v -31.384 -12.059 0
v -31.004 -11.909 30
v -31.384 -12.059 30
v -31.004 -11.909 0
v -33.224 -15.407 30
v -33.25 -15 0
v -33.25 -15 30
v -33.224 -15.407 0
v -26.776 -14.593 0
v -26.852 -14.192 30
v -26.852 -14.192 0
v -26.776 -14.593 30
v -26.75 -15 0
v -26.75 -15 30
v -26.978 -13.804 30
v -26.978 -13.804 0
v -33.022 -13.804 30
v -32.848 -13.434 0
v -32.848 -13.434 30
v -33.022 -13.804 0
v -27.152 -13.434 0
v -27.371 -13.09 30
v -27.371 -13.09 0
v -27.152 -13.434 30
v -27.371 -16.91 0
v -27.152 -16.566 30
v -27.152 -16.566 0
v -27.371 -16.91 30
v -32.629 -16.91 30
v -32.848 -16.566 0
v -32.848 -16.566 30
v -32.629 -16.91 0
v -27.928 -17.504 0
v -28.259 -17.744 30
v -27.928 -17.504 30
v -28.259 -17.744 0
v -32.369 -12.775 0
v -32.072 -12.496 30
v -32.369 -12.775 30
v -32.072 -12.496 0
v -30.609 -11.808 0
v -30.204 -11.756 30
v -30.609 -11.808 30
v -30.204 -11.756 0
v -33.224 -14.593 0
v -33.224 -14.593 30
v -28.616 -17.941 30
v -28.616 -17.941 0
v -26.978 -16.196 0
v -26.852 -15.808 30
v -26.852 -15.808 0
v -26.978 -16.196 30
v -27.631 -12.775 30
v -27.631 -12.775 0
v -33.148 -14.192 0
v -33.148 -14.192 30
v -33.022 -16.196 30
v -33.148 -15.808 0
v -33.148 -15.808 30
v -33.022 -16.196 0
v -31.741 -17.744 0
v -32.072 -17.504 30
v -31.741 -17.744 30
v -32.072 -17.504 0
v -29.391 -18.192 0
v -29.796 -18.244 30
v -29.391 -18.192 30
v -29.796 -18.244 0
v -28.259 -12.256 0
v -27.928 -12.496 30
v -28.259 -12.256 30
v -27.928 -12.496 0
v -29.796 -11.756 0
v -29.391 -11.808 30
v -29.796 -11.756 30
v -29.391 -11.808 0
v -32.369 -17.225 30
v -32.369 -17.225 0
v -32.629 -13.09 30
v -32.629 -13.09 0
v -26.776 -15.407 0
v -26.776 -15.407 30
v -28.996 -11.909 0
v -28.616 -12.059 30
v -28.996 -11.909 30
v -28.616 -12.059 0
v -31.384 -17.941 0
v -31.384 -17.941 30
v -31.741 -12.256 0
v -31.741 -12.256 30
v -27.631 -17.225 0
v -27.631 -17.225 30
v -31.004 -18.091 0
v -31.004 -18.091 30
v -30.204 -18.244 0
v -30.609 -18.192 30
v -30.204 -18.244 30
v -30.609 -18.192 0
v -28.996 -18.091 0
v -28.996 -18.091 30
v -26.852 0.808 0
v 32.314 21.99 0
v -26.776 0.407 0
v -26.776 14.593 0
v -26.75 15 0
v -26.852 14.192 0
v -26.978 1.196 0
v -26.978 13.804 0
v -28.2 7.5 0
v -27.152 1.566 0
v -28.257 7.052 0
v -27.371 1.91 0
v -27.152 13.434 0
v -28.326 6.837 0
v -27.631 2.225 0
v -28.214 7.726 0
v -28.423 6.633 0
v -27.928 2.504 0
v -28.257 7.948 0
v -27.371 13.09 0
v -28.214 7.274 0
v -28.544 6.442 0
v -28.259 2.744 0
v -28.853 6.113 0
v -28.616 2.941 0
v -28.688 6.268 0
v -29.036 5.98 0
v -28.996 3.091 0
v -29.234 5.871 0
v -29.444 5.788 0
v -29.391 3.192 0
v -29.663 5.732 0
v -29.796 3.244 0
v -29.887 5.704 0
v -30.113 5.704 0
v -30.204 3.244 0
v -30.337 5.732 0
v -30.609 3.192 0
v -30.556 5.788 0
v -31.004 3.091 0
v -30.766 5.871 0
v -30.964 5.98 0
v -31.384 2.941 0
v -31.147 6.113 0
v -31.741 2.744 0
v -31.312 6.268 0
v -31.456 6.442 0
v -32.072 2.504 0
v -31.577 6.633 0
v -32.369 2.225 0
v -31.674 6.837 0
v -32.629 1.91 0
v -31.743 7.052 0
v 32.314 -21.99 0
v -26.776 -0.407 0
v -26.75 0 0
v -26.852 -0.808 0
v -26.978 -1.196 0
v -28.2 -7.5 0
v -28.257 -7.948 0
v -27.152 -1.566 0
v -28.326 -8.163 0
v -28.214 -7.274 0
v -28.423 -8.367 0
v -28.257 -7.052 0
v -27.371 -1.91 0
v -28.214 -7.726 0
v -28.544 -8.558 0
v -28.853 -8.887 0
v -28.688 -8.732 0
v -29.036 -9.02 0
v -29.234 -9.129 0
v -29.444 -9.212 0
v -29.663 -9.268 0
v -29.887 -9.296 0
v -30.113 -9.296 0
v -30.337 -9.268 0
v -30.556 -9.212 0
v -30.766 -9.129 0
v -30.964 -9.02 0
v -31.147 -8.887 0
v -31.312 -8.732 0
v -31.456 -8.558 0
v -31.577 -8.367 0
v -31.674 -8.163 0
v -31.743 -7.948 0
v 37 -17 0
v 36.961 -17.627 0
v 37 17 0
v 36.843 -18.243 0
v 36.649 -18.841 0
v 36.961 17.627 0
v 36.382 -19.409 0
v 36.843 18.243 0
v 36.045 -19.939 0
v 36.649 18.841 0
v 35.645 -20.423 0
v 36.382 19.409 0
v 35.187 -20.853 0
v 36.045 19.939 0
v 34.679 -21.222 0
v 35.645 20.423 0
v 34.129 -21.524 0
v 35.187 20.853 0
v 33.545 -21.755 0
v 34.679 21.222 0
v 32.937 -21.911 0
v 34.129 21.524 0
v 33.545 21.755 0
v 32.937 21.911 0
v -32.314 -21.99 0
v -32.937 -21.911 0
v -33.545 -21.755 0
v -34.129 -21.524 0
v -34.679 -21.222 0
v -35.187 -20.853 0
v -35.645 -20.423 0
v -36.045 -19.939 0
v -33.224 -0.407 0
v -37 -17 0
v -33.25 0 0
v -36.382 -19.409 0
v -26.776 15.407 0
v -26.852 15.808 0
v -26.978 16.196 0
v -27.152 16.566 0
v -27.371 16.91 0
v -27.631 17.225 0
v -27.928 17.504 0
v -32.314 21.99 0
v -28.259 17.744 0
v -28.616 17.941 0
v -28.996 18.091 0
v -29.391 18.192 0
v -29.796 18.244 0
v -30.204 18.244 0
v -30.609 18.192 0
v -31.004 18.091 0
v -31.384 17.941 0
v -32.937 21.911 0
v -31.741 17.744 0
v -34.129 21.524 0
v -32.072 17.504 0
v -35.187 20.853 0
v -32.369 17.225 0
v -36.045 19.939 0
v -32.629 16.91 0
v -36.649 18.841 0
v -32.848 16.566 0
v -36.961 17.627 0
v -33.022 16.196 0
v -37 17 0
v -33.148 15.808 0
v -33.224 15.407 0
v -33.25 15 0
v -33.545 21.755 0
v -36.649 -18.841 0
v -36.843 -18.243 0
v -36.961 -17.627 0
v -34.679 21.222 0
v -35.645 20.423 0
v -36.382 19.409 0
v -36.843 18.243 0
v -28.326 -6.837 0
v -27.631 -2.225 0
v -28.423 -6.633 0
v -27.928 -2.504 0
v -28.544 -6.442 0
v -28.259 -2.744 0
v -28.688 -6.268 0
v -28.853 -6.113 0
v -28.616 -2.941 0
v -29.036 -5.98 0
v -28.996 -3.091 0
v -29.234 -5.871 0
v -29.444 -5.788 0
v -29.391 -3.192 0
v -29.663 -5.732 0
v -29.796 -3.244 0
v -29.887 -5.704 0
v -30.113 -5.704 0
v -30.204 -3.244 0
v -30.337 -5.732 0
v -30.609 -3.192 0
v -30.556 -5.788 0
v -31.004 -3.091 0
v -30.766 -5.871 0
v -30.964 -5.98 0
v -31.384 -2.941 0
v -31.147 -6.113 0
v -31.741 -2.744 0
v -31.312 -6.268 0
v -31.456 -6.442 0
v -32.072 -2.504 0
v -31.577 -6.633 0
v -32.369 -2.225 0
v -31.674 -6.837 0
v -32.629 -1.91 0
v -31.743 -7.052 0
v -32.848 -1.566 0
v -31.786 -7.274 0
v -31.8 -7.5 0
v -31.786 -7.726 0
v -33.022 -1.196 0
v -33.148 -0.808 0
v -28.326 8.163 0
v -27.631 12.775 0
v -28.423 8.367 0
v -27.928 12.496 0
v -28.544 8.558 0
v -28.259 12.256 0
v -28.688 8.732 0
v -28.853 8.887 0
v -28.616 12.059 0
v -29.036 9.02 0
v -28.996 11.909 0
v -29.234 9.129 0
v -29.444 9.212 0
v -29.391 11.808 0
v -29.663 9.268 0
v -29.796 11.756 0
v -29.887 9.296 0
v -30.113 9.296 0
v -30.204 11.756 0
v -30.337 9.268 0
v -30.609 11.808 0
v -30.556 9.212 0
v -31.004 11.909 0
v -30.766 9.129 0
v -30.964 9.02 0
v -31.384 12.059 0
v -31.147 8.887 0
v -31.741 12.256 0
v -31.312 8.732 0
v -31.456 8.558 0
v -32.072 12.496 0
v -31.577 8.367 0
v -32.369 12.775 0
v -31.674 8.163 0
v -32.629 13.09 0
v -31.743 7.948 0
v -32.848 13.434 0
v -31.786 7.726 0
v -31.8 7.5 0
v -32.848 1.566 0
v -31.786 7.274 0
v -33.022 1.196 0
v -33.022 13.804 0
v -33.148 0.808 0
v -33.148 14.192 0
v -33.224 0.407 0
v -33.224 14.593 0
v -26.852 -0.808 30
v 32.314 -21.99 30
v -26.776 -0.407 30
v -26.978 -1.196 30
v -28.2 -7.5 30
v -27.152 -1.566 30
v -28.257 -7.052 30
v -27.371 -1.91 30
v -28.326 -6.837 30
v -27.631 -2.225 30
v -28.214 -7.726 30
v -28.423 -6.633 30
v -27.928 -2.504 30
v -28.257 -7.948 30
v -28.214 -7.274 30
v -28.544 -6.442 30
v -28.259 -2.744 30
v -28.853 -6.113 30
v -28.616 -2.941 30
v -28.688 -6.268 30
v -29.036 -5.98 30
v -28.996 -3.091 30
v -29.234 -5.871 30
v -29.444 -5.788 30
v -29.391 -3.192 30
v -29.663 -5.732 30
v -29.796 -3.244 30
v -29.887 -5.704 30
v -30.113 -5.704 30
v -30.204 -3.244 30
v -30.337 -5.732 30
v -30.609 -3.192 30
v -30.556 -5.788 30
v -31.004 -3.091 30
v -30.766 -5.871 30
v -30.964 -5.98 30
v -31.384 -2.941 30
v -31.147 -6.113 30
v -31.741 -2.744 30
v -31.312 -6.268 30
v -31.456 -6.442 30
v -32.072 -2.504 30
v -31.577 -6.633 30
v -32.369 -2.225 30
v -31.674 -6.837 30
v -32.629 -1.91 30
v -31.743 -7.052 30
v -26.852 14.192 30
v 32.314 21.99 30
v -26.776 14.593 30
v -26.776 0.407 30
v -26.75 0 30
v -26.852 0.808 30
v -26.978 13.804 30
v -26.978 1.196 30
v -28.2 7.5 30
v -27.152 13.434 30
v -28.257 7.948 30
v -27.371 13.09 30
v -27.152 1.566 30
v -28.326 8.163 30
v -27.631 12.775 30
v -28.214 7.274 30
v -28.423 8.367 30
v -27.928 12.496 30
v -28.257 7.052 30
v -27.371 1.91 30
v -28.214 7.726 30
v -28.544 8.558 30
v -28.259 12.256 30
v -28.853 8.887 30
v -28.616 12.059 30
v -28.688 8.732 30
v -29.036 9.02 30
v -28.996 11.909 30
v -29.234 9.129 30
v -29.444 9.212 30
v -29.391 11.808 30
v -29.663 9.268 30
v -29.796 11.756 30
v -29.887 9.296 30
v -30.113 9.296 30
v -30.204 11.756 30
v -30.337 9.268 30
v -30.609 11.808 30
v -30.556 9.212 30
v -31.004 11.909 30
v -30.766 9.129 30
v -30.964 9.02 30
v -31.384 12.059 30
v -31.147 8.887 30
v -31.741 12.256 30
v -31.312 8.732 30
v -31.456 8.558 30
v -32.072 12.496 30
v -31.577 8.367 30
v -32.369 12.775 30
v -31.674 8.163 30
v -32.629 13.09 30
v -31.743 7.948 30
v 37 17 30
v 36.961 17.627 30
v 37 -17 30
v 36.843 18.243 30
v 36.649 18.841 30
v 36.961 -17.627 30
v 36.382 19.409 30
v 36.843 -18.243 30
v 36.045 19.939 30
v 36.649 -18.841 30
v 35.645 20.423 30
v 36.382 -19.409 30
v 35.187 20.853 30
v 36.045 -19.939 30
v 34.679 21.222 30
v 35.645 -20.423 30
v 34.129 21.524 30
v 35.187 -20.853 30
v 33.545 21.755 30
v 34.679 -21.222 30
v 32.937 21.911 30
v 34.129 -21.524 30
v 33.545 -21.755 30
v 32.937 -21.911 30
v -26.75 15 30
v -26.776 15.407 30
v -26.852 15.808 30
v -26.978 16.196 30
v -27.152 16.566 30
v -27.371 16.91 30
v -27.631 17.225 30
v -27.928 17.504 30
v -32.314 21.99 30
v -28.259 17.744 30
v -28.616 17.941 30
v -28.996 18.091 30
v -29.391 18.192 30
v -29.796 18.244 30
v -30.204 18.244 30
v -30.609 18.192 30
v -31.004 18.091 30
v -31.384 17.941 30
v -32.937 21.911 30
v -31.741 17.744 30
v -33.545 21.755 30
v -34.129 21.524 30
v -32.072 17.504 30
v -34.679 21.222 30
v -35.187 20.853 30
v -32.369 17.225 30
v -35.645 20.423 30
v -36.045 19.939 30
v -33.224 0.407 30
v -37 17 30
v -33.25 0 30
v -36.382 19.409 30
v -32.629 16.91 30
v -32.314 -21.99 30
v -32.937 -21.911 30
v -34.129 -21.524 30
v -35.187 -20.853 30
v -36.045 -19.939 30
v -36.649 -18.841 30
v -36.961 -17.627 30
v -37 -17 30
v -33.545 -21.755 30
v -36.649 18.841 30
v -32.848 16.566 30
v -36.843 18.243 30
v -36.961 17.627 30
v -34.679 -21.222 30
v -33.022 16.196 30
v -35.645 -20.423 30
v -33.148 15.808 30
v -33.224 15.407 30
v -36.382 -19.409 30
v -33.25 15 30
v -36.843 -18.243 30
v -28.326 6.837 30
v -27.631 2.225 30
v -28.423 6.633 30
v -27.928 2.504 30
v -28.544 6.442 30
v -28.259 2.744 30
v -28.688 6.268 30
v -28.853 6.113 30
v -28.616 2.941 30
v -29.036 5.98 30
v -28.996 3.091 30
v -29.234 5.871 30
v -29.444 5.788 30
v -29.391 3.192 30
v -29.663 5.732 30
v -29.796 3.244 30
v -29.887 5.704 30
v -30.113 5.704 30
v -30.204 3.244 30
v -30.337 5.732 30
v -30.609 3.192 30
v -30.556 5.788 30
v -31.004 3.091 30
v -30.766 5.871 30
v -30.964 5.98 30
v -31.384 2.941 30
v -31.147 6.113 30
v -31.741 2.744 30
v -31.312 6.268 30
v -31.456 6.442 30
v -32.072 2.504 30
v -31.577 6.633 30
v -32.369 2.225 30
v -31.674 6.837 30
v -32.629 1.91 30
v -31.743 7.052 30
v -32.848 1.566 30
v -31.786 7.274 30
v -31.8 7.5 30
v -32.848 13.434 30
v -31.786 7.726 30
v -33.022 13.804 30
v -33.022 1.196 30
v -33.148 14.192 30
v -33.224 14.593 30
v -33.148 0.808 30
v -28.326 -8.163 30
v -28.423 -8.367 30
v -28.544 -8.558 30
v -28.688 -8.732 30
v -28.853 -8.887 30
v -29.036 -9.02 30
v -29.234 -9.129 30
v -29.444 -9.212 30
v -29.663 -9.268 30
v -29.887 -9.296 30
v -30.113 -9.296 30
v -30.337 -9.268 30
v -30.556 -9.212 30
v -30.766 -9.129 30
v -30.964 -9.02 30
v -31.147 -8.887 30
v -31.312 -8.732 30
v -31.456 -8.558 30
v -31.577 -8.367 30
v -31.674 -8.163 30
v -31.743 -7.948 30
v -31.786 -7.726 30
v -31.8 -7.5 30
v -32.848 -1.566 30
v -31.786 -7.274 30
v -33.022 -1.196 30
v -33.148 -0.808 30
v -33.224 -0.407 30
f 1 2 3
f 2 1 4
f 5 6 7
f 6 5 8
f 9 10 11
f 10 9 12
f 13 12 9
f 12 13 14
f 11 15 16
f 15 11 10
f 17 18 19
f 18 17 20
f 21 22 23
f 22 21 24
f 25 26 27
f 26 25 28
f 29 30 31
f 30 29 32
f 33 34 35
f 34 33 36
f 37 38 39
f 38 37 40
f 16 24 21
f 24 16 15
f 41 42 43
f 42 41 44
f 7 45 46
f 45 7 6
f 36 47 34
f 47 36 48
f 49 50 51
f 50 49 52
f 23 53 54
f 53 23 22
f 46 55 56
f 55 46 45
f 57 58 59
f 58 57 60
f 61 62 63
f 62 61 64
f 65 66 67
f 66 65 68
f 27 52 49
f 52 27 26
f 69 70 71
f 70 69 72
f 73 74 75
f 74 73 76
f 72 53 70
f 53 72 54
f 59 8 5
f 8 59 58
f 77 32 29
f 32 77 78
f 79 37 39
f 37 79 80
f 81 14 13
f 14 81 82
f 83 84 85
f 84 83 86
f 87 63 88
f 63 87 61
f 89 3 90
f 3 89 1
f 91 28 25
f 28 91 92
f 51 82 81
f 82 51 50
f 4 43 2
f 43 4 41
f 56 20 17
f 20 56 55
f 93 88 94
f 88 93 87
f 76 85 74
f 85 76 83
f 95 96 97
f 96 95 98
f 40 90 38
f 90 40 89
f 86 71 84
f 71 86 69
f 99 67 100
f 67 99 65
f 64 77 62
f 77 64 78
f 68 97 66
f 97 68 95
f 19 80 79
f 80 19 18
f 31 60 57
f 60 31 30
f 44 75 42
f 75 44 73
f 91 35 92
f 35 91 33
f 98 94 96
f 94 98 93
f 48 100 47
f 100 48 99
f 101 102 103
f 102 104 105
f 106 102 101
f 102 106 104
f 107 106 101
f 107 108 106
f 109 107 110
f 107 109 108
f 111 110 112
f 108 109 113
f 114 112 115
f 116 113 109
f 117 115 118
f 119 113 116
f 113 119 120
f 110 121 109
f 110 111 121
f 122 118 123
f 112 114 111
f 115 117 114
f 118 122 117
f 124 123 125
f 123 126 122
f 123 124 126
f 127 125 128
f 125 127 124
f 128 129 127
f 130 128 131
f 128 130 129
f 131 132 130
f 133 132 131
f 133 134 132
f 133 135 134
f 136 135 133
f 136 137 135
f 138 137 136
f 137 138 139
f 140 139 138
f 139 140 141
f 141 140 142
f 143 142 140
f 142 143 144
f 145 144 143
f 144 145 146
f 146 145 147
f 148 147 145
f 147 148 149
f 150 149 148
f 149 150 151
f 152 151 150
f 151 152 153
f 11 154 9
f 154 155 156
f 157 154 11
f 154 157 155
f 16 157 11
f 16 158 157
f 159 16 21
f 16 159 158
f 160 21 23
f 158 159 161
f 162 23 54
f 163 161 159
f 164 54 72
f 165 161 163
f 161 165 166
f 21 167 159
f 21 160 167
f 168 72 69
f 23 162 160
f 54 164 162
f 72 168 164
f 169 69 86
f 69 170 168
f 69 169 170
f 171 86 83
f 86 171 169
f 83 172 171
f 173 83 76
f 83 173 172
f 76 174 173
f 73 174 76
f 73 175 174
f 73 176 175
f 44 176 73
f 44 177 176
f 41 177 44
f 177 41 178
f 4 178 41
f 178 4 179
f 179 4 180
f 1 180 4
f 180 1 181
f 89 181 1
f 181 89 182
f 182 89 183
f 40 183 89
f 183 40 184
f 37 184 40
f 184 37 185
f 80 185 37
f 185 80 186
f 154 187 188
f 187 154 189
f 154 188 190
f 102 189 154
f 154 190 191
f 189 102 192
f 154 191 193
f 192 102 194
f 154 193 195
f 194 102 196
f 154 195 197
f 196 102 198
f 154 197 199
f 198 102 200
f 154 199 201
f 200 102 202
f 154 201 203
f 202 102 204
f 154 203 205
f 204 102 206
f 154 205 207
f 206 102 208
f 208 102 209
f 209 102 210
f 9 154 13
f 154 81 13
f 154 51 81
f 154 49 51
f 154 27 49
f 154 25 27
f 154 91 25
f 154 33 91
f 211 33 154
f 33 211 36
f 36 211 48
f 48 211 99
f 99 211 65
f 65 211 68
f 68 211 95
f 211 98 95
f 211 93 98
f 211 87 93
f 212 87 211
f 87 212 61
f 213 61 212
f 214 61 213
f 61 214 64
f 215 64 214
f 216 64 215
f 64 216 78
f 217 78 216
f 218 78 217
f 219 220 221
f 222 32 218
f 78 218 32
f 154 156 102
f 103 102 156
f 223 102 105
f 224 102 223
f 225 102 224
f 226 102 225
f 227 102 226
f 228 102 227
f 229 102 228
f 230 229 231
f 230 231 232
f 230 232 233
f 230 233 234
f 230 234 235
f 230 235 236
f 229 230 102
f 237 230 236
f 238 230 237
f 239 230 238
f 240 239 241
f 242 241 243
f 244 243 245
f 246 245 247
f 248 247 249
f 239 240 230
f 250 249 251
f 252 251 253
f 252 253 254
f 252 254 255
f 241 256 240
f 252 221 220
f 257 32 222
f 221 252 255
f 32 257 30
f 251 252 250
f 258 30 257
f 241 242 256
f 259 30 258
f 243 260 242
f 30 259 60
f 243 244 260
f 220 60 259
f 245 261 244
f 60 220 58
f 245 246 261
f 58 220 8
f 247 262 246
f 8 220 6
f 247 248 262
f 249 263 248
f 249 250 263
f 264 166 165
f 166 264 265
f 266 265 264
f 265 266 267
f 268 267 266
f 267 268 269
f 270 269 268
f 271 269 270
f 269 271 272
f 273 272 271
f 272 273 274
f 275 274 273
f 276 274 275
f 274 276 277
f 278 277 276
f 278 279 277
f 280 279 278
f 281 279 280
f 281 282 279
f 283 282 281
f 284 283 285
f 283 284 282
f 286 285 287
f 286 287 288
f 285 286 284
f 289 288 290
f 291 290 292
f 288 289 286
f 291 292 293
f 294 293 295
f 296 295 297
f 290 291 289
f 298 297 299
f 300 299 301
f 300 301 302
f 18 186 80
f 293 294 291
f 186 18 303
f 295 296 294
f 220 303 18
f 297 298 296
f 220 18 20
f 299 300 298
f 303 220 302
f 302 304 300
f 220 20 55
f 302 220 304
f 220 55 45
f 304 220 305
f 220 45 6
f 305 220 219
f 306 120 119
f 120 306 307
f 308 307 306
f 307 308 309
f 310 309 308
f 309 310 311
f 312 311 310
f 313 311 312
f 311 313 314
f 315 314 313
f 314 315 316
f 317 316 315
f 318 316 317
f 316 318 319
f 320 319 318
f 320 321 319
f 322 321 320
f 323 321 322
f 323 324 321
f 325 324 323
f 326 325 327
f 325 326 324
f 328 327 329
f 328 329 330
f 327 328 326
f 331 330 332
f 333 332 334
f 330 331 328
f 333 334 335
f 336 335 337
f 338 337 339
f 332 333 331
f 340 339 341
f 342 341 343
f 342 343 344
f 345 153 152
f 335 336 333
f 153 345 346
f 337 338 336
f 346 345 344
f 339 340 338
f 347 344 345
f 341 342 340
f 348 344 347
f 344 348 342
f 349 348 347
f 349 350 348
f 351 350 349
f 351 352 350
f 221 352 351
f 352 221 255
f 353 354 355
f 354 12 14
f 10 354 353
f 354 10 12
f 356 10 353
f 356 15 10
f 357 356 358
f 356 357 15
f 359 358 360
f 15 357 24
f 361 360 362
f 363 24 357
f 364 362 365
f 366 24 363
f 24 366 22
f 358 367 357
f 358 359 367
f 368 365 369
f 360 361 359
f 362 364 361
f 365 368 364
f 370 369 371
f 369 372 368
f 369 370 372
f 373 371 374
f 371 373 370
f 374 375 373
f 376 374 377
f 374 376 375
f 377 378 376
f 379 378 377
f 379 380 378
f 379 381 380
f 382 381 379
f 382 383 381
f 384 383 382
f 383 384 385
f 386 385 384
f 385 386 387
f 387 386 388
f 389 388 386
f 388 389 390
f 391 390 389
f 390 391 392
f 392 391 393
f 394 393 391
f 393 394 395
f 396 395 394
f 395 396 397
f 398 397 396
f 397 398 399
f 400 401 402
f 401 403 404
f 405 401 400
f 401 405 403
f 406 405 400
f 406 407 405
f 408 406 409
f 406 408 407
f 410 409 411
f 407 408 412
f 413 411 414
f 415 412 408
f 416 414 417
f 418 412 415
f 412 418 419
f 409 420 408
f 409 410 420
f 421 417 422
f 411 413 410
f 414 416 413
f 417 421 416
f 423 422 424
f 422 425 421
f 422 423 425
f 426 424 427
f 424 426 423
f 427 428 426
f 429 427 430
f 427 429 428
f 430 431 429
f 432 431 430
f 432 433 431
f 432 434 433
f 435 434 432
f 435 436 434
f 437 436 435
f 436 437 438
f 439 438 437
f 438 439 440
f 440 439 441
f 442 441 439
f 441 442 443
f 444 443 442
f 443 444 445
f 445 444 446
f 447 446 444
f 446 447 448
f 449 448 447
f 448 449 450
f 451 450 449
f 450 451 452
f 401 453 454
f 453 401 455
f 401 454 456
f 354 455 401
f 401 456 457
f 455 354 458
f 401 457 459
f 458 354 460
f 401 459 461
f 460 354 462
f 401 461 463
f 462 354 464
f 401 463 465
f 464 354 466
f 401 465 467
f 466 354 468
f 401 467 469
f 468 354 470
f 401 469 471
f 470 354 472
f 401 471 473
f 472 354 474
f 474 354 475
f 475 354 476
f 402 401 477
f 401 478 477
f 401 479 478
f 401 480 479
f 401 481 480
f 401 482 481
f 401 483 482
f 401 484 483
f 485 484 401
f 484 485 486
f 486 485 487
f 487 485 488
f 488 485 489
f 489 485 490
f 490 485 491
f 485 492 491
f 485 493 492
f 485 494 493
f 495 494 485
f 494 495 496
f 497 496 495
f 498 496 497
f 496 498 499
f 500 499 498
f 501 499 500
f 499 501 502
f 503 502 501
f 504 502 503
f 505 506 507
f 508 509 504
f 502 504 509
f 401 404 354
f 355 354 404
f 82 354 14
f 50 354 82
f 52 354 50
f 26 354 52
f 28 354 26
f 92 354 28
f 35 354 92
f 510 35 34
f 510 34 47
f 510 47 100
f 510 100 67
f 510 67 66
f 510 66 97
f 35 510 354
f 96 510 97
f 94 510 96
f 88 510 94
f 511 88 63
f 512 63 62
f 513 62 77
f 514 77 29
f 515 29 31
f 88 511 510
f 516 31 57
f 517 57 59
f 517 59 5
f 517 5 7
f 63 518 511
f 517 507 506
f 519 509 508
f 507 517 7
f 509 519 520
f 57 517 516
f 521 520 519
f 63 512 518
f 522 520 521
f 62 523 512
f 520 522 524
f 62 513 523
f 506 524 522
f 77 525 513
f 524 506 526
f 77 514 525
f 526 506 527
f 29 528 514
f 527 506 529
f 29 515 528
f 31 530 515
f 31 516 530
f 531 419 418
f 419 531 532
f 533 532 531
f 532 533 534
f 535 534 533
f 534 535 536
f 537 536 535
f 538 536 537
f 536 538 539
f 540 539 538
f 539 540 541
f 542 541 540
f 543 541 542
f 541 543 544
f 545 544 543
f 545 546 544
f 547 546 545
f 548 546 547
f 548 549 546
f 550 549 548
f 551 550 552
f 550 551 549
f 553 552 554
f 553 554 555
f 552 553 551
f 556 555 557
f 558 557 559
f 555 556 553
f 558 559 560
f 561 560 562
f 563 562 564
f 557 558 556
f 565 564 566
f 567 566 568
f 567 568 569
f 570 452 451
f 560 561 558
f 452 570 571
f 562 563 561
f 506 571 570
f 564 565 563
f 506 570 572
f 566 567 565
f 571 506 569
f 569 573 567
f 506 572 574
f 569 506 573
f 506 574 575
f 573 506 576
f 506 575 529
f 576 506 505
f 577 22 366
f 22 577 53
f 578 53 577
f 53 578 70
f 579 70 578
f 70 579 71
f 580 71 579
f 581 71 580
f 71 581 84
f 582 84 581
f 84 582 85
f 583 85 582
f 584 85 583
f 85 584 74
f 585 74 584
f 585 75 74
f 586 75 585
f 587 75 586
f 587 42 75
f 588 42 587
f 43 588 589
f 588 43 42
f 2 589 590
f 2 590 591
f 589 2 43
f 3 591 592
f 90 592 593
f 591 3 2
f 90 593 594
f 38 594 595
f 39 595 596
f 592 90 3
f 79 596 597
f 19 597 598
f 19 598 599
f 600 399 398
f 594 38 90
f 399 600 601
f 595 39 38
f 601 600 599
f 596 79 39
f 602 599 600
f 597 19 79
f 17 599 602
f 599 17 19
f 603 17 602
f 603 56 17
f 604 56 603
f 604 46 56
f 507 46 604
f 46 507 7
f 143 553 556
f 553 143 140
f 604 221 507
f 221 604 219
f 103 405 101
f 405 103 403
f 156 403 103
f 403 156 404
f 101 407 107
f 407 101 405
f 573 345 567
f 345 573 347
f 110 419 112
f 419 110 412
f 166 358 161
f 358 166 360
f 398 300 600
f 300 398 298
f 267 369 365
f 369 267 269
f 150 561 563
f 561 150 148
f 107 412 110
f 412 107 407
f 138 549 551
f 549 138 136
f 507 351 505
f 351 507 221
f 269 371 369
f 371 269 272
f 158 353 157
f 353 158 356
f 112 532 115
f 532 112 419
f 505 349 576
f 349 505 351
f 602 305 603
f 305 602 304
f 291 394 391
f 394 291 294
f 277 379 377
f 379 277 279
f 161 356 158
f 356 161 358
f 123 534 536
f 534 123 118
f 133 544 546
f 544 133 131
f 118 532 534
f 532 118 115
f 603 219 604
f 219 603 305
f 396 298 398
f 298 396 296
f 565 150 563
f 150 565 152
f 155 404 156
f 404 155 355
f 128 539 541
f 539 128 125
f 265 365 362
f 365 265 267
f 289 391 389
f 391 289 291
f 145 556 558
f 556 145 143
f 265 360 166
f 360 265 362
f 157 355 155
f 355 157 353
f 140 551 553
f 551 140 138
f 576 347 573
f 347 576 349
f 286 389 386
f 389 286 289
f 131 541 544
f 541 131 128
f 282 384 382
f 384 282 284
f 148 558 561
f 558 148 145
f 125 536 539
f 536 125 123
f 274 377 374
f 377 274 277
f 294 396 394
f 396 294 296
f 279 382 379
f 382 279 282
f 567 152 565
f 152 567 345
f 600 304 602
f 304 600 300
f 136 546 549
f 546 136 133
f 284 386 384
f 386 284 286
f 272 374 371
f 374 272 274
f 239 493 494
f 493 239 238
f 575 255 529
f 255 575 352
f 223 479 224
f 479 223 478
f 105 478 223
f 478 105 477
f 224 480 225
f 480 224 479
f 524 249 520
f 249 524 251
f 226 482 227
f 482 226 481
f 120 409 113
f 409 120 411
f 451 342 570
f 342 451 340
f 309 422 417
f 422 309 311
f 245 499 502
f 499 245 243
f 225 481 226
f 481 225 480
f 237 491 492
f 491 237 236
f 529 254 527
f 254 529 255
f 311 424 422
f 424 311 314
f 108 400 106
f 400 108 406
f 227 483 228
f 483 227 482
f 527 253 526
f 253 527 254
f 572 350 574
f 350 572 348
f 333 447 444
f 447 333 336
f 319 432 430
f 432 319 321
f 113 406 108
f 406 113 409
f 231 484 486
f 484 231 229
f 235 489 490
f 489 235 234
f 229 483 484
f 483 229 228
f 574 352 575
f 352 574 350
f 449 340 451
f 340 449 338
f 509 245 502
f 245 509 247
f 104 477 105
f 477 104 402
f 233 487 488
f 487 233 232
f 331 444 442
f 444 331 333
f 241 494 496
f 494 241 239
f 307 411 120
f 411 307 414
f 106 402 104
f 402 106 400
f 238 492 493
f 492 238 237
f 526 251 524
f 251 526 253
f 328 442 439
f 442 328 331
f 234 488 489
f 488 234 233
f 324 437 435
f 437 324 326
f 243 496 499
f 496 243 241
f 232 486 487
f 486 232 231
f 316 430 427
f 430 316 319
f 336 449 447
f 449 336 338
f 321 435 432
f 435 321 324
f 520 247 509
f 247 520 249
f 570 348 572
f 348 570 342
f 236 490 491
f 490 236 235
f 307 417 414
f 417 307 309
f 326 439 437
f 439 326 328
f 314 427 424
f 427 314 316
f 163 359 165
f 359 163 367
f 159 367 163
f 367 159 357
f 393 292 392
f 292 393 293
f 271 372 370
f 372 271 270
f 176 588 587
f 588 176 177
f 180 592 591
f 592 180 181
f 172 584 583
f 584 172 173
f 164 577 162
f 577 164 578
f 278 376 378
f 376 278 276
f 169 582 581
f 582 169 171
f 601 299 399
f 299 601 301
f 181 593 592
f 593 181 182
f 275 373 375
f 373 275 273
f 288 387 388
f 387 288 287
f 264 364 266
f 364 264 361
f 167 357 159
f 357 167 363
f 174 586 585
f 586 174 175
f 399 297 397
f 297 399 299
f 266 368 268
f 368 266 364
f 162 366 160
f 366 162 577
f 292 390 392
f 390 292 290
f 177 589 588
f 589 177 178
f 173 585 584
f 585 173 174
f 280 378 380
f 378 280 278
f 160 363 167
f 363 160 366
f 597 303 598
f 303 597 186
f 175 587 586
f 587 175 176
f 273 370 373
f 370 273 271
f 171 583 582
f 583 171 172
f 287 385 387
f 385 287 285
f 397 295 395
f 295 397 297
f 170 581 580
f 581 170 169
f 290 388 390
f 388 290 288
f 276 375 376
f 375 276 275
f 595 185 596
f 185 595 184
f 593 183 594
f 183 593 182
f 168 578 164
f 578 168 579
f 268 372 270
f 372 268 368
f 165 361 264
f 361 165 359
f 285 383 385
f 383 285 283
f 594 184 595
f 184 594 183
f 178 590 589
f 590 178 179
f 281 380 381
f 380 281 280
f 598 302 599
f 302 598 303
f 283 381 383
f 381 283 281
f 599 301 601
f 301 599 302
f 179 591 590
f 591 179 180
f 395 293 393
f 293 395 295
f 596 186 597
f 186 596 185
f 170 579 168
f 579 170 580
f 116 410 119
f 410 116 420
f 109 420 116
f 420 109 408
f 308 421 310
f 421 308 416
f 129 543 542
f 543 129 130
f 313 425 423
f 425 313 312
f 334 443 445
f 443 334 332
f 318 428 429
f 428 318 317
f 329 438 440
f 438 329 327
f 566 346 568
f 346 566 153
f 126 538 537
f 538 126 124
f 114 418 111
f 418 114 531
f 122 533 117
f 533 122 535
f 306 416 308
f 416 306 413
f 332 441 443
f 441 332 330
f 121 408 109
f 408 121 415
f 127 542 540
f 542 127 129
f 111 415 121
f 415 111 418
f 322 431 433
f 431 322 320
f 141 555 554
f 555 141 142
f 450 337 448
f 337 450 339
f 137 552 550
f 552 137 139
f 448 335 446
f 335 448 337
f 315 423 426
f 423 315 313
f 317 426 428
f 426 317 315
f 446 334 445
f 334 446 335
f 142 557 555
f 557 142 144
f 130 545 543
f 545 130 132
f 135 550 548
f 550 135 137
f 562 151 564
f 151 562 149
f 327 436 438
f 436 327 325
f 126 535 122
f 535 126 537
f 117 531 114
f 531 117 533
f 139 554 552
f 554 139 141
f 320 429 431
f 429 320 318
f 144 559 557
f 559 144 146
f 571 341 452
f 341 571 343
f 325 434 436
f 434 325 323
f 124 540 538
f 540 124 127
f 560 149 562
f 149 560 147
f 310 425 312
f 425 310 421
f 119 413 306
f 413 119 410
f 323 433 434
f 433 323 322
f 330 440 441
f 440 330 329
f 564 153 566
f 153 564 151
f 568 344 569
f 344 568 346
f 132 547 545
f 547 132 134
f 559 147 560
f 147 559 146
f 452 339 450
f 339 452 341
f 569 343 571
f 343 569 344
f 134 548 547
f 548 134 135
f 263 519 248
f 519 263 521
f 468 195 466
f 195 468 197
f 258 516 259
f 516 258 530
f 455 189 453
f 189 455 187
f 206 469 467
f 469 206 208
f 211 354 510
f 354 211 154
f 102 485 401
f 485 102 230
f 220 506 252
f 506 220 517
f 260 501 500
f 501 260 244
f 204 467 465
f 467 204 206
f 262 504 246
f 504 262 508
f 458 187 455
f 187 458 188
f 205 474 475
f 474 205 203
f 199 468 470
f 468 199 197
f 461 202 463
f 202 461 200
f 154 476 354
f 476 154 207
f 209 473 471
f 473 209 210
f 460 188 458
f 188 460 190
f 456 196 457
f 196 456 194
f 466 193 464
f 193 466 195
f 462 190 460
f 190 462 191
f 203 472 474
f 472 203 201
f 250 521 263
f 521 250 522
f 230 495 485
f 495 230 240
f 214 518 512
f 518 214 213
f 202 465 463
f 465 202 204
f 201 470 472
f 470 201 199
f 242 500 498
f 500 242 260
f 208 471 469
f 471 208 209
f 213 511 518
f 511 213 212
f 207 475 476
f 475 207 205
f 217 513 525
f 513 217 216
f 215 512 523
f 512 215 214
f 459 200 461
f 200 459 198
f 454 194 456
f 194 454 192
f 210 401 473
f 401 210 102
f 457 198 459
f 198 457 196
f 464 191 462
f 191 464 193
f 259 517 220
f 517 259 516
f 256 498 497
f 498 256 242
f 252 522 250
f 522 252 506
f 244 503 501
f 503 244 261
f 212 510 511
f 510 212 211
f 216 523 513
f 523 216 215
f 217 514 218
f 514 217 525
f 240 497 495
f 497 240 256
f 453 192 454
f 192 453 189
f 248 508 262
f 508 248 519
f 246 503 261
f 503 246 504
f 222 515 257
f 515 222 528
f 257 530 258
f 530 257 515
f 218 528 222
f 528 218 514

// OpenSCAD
$fn = 50;


difference() {
	union() {
		hull() {
			translate(v = [-32.0000000000, 17.0000000000, 0]) {
				cylinder(h = 30, r = 5);
			}
			translate(v = [32.0000000000, 17.0000000000, 0]) {
				cylinder(h = 30, r = 5);
			}
			translate(v = [-32.0000000000, -17.0000000000, 0]) {
				cylinder(h = 30, r = 5);
			}
			translate(v = [32.0000000000, -17.0000000000, 0]) {
				cylinder(h = 30, r = 5);
			}
		}
	}
	union() {
		translate(v = [-30.0000000000, -15.0000000000, 0]) {
			cylinder(h = 30, r = 3.2500000000);
		}
		translate(v = [-30.0000000000, 0.0000000000, 0]) {
			cylinder(h = 30, r = 3.2500000000);
		}
		translate(v = [-30.0000000000, 15.0000000000, 0]) {
			cylinder(h = 30, r = 3.2500000000);
		}
		translate(v = [-30.0000000000, -15.0000000000, 0]) {
			cylinder(h = 30, r = 1.8000000000);
		}
		translate(v = [-30.0000000000, -7.5000000000, 0]) {
			cylinder(h = 30, r = 1.8000000000);
		}
		translate(v = [-30.0000000000, 0.0000000000, 0]) {
			cylinder(h = 30, r = 1.8000000000);
		}
		translate(v = [-30.0000000000, 7.5000000000, 0]) {
			cylinder(h = 30, r = 1.8000000000);
		}
		translate(v = [-30.0000000000, 15.0000000000, 0]) {
			cylinder(h = 30, r = 1.8000000000);
		}
		translate(v = [-30.0000000000, -15.0000000000, 0]) {
			cylinder(h = 30, r = 1.8000000000);
		}
		translate(v = [-30.0000000000, -7.5000000000, 0]) {
			cylinder(h = 30, r = 1.8000000000);
		}
		translate(v = [-30.0000000000, 0.0000000000, 0]) {
			cylinder(h = 30, r = 1.8000000000);
		}
		translate(v = [-30.0000000000, 7.5000000000, 0]) {
			cylinder(h = 30, r = 1.8000000000);
		}
		translate(v = [-30.0000000000, 15.0000000000, 0]) {
			cylinder(h = 30, r = 1.8000000000);
		}
		translate(v = [-30.0000000000, -15.0000000000, 0]) {
			cylinder(h = 30, r = 1.8000000000);
		}
		translate(v = [-30.0000000000, -7.5000000000, 0]) {
			cylinder(h = 30, r = 1.8000000000);
		}
		translate(v = [-30.0000000000, 0.0000000000, 0]) {
			cylinder(h = 30, r = 1.8000000000);
		}
		translate(v = [-30.0000000000, 7.5000000000, 0]) {
			cylinder(h = 30, r = 1.8000000000);
		}
		translate(v = [-30.0000000000, 15.0000000000, 0]) {
			cylinder(h = 30, r = 1.8000000000);
		}
	}
}
